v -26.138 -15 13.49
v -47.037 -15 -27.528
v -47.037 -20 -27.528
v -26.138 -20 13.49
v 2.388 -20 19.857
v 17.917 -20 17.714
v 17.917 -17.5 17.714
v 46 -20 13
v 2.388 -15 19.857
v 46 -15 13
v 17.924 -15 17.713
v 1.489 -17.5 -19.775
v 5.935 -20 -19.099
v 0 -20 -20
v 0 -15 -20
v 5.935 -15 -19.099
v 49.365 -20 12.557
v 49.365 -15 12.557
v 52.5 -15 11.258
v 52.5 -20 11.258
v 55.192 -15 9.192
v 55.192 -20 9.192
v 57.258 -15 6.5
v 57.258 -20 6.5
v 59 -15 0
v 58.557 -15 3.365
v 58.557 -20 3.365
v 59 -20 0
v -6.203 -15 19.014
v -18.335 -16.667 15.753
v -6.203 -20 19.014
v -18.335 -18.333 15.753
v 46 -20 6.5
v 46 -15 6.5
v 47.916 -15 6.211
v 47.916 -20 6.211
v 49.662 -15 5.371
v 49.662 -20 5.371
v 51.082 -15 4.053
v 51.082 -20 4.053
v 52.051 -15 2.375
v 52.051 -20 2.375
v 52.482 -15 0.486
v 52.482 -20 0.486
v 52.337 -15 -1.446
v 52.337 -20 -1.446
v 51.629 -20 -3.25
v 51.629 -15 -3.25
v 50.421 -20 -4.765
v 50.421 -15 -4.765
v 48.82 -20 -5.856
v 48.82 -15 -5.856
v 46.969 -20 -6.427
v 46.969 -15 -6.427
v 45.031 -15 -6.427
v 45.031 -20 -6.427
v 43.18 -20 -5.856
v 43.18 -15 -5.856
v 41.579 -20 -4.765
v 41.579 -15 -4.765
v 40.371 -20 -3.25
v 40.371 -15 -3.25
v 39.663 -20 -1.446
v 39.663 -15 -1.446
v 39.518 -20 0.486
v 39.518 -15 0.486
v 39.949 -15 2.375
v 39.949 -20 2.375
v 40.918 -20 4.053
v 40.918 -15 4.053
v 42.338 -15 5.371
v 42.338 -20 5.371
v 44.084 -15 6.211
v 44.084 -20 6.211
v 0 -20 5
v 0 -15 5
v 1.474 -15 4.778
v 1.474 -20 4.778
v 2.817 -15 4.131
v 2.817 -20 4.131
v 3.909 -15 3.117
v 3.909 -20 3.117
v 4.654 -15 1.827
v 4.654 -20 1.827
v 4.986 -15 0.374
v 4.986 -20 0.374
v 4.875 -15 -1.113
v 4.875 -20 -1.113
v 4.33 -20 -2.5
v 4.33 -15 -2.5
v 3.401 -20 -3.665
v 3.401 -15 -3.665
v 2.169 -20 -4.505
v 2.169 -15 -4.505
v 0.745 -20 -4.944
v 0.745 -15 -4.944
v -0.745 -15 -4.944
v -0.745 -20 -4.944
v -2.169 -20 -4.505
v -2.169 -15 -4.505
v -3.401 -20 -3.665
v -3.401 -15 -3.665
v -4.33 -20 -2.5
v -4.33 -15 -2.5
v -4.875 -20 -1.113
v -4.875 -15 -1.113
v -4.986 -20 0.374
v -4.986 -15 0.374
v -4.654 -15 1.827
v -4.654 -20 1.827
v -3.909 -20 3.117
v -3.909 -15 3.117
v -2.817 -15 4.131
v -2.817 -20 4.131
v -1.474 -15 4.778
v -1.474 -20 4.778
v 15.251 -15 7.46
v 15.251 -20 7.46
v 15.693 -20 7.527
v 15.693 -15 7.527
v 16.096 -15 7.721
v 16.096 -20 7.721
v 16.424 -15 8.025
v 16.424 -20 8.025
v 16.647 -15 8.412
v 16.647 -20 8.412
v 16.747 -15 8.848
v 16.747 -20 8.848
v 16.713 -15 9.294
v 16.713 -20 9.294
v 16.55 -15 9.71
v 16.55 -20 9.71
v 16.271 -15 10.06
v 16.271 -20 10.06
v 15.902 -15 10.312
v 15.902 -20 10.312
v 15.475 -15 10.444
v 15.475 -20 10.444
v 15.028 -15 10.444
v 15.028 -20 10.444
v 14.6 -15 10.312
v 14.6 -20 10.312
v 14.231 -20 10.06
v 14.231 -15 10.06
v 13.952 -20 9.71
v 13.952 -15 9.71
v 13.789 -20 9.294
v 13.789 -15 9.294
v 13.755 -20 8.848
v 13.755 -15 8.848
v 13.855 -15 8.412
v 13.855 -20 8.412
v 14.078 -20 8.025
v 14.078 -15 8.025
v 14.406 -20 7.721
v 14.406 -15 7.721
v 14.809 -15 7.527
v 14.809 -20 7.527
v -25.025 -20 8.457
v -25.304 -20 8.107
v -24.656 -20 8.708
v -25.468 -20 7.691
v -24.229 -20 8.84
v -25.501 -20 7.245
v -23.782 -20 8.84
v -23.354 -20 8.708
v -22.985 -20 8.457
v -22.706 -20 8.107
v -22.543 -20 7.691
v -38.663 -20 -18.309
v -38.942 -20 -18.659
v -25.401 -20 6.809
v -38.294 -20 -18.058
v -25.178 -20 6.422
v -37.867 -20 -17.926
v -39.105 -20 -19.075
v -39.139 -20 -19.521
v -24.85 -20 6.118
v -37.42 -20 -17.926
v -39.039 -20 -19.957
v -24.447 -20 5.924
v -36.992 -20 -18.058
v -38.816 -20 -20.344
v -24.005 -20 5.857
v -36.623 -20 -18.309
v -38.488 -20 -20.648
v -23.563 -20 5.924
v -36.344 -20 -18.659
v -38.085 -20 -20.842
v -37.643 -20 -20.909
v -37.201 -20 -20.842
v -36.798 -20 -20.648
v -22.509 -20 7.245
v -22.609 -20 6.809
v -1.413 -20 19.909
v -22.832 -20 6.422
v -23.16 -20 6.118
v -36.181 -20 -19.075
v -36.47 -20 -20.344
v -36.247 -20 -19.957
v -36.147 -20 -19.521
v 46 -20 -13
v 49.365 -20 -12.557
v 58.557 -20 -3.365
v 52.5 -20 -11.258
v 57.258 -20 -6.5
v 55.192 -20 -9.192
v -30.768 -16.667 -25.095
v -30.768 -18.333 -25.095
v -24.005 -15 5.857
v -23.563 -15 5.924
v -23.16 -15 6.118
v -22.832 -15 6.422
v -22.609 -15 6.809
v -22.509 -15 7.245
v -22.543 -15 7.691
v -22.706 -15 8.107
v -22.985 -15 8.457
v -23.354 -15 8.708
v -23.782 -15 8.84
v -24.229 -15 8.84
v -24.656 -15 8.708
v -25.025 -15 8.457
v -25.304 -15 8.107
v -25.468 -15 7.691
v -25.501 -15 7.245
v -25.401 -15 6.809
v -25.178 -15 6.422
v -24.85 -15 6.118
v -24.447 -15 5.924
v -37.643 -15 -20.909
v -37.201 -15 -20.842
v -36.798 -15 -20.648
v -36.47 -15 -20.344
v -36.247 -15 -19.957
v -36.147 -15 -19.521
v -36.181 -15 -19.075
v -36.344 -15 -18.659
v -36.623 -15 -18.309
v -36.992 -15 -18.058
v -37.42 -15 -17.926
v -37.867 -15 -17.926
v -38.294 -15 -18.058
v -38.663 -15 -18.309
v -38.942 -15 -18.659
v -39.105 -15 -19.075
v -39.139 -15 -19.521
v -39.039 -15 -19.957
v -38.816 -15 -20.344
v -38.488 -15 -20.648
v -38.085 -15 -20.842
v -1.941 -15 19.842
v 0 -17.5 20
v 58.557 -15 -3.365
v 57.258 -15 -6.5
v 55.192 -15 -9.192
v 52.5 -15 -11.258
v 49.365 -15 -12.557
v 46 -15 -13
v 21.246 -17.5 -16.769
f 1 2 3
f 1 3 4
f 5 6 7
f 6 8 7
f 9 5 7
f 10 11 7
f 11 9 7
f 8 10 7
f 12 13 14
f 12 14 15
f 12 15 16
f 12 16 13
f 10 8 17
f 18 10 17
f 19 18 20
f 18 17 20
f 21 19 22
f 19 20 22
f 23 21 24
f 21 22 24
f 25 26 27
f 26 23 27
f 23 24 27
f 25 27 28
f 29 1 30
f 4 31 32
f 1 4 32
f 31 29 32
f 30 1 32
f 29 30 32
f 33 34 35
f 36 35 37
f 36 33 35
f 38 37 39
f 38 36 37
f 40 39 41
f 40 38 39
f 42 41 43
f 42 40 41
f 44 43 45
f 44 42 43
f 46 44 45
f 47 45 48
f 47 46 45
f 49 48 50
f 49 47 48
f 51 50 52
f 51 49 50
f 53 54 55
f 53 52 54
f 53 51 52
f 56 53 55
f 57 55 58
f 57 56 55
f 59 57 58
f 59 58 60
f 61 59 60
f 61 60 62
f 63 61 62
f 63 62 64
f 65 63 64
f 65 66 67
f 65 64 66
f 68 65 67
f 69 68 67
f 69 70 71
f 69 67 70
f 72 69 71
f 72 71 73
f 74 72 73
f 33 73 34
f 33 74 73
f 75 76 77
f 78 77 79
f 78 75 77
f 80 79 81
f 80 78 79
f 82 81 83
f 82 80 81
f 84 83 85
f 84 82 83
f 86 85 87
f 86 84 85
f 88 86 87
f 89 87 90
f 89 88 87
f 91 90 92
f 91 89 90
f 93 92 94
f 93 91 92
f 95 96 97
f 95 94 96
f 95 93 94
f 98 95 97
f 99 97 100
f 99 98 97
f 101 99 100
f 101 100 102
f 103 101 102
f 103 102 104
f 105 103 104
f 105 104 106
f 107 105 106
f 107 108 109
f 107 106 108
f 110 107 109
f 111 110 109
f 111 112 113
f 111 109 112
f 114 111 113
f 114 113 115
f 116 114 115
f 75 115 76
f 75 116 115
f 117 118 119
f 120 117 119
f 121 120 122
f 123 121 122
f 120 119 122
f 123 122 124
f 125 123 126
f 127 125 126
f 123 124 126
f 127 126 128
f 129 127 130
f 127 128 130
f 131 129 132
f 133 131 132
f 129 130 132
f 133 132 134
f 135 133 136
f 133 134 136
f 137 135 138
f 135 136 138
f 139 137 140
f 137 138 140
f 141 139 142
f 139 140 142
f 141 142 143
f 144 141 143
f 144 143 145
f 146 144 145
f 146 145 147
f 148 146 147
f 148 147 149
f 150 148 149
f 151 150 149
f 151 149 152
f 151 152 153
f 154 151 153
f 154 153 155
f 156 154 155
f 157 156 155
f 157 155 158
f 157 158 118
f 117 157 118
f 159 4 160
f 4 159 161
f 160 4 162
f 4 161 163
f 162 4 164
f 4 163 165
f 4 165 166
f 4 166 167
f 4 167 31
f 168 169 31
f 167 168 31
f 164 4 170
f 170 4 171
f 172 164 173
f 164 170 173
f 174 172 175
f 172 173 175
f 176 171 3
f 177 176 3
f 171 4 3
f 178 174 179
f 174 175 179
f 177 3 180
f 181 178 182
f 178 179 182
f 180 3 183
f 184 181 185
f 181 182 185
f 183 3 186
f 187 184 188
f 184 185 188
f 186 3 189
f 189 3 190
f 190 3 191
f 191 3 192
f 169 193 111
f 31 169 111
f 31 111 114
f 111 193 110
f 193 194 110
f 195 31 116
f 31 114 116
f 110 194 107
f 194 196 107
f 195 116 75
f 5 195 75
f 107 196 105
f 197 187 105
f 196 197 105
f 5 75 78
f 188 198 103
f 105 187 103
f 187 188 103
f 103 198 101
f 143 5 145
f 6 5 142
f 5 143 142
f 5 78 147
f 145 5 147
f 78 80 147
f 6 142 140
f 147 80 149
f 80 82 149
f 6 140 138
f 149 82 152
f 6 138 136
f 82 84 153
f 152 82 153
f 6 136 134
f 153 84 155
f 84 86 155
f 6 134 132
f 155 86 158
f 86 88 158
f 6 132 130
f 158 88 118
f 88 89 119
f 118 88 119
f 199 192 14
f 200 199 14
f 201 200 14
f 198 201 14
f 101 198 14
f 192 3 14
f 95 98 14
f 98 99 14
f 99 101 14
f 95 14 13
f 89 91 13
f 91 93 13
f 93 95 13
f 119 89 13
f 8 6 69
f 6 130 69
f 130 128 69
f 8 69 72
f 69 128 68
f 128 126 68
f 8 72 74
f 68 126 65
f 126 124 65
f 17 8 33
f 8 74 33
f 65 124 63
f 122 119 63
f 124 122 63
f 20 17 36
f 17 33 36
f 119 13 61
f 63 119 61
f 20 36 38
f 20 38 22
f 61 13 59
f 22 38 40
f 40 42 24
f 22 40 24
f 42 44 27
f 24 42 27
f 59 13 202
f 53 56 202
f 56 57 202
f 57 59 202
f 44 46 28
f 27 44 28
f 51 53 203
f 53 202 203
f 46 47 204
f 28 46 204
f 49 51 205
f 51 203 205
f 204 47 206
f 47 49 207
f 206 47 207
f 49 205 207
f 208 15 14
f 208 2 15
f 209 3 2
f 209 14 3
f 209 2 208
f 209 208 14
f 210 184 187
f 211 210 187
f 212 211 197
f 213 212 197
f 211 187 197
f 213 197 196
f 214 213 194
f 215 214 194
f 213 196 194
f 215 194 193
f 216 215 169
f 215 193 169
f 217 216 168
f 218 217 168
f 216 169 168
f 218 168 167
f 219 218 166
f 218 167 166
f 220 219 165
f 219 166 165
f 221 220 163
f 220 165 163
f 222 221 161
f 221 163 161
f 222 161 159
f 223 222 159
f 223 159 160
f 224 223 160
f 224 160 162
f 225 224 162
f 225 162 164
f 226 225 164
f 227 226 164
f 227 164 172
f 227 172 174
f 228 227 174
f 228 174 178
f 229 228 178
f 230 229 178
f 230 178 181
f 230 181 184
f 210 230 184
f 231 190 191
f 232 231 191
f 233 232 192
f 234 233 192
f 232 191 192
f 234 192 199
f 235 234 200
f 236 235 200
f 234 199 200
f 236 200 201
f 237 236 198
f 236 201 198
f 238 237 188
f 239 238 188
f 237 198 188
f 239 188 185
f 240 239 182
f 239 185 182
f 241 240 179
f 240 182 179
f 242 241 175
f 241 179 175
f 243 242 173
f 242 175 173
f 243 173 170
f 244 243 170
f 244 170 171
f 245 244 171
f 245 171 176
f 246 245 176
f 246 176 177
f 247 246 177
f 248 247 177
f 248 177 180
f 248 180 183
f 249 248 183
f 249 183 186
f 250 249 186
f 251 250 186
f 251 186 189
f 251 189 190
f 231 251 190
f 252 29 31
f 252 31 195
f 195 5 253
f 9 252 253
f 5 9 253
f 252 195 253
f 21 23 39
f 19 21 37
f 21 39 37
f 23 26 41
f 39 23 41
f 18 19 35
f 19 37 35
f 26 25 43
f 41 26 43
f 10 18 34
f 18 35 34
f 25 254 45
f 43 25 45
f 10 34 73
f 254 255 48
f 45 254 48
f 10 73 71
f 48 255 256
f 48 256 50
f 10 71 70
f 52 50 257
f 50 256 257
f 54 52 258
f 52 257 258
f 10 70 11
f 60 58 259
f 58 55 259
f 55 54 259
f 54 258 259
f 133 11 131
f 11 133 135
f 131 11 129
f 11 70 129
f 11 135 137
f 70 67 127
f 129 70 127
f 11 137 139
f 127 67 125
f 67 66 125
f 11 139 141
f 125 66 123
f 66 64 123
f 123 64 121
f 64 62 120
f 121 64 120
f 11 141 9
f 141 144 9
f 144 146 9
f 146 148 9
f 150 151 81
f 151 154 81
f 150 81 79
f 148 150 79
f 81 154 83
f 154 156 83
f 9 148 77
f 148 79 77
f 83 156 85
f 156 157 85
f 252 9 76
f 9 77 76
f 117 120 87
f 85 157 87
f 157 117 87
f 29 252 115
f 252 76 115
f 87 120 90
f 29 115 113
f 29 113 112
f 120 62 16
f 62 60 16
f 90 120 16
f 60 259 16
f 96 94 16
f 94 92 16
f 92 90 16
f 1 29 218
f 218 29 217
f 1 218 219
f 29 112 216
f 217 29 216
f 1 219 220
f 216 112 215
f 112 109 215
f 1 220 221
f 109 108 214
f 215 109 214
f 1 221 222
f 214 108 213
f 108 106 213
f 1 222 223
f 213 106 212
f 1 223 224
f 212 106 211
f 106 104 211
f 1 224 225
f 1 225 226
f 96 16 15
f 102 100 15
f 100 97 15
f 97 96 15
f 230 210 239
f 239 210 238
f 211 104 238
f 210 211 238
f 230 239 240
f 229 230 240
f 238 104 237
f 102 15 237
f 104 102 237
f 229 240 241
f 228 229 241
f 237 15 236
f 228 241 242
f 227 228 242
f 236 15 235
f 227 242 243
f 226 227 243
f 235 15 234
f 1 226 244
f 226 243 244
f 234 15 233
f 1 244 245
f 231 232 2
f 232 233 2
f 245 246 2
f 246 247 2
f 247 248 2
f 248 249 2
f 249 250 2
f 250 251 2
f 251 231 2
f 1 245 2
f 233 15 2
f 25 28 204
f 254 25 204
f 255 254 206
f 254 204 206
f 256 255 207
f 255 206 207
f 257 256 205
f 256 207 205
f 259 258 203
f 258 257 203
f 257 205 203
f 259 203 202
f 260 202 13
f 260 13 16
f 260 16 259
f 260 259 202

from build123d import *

# Parameters (mm, degrees)
BOSS_EXTRUDE1_DEPTH      = 20
BOSS_EXTRUDE1_DEPTH_BACK = 20
SKETCH1_R                = 5
SKETCH1_R_2              = 6.5
CUT_EXTRUDE4_DEPTH       = 35
SKETCH6_R                = 1.5
CUT_EXTRUDE5_DEPTH       = 10
CUT_EXTRUDE6_DEPTH       = 50


with BuildPart() as part:
    # Sketch1 → Boss-Extrude1 (new, two sides: drawn at the far end of the back side and taken through both)
    # profile 1 of 5: a face of its own
    with BuildSketch(Plane(origin=(0, 0, 0), x_dir=(1, 0, 0), z_dir=(0, 1, 0)).offset(-BOSS_EXTRUDE1_DEPTH_BACK)):
        with BuildLine():
            add(Edge.make_bspline(
                [(-328.284271247, 28.284271247), (-322.910070204, 33.658472291), (-311.873452078, 37.427029787), (-296.732235412, 39.86629798)],
                knots=[0, 0, 0, 0, 0.1900067, 0.1900067, 0.1900067, 0.1900067], degree=3))
            ThreePointArc((-328.284271247, 28.284271247), (-328.284271247, -28.284271247), (-271.715728753, -28.284271247))
            ThreePointArc((-271.715728753, -28.284271247), (-263.0448187, -15.307337295), (-260, 0))
            ThreePointArc((-260, 0), (-270.583078139, 27.104330064), (-296.732235412, 39.86629798))
        make_face()
    # profile 2 of 5: a face of its own
    with BuildSketch(Plane(origin=(0, 0, 0), x_dir=(1, 0, 0), z_dir=(0, 1, 0)).offset(-BOSS_EXTRUDE1_DEPTH_BACK)):
        with BuildLine():
            ThreePointArc((-260, 0), (-263.0448187, -15.307337295), (-271.715728753, -28.284271247))
            add(Edge.make_bspline(
                [(-271.715728753, -28.284271247), (-194.91847241, 48.512985095), (-42.964488834, -10.495172733), (-6.202879594, -19.013791961)],
                knots=[0, 0, 0, 0, 0.930923327, 0.930923327, 0.930923327, 0.930923327], degree=3))
            ThreePointArc((-6.202879594, -19.013791961), (-19.751909265, 3.140394942), (0, 20))
            add(Edge.make_bspline(
                [(-296.732235412, 39.86629798), (-232.185648118, 50.264830728), (-93.046467117, 36.506278231), (0, 20)],
                knots=[0.1900067, 0.1900067, 0.1900067, 0.1900067, 1, 1, 1, 1], degree=3))
            ThreePointArc((-296.732235412, 39.86629798), (-270.583078139, 27.104330064), (-260, 0))
        make_face()
    # profile 3 of 5: a face of its own
    with BuildSketch(Plane(origin=(0, 0, 0), x_dir=(1, 0, 0), z_dir=(0, 1, 0)).offset(-BOSS_EXTRUDE1_DEPTH_BACK)):
        with BuildLine():
            ThreePointArc((0, 20), (-19.751909265, 3.140394942), (-6.202879594, -19.013791961))
            add(Edge.make_bspline(
                [(-6.202879594, -19.013791961), (-3.475082803, -19.645893294), (-1.381533462, -20), (0, -20)],
                knots=[0.930923327, 0.930923327, 0.930923327, 0.930923327, 1, 1, 1, 1], degree=3))
            add(Edge.make_bspline(
                [(0, -20), (0.844585297, -20), (2.387633143, -19.856968751)],
                knots=[0, 0, 0, 0.142944169, 0.142944169, 0.142944169], degree=2))
            ThreePointArc((2.387633143, -19.856968751), (14.9624975, -13.271159278), (20, 0))
            ThreePointArc((20, 0), (16.104446086, 11.859461044), (5.935318374, 19.0990051))
            add(Edge.make_bspline(
                [(0, 20), (0.011302239, 20), (5.935318374, 19.0990051)],
                knots=[0, 0, 0, 0.358766717, 0.358766717, 0.358766717], degree=2))
        make_face()
        with Locations(Location((0, 0, 0), (0, 0, 270))):
            Circle(SKETCH1_R, mode=Mode.SUBTRACT)
    # profile 4 of 5: a face of its own
    with BuildSketch(Plane(origin=(0, 0, 0), x_dir=(1, 0, 0), z_dir=(0, 1, 0)).offset(-BOSS_EXTRUDE1_DEPTH_BACK)):
        with BuildLine():
            add(Edge.make_bspline(
                [(5.935318374, 19.0990051), (16.523469771, 17.488632981), (46, 13)],
                knots=[0.358766717, 0.358766717, 0.358766717, 1, 1, 1], degree=2))
            ThreePointArc((5.935318374, 19.0990051), (16.104446086, 11.859461044), (20, 0))
            ThreePointArc((20, 0), (14.9624975, -13.271159278), (2.387633143, -19.856968751))
            add(Edge.make_bspline(
                [(2.387633143, -19.856968751), (11.639344201, -18.999390814), (46, -13)],
                knots=[0.142944169, 0.142944169, 0.142944169, 1, 1, 1], degree=2))
            ThreePointArc((46, -13), (33, 0), (46, 13))
        make_face()
    # profile 5 of 5: a face of its own
    with BuildSketch(Plane(origin=(0, 0, 0), x_dir=(1, 0, 0), z_dir=(0, 1, 0)).offset(-BOSS_EXTRUDE1_DEPTH_BACK)):
        with BuildLine():
            ThreePointArc((59, 0), (55.192388155, 9.192388155), (46, 13))
            ThreePointArc((46, 13), (33, 0), (46, -13))
            ThreePointArc((46, -13), (55.192388155, -9.192388155), (59, 0))
        make_face()
        with Locations(Location((46, 0, 0), (0, 0, 270))):
            Circle(SKETCH1_R_2, mode=Mode.SUBTRACT)
    extrude(amount=BOSS_EXTRUDE1_DEPTH + BOSS_EXTRUDE1_DEPTH_BACK)

    # Sketch5 → Cut-Extrude4 (cut)
    with BuildSketch(Plane(origin=(0, 20, 0), x_dir=(1, 0, 0), z_dir=(0, 1, 0))):
        Polygon((-47.037049996, 27.527548523), (92.120786702, 16.164640032), (85.724700256, -16.918764701), (-17.262768022, -30.907770073), align=None)
    extrude(amount=-CUT_EXTRUDE4_DEPTH, mode=Mode.SUBTRACT)

    # Sketch6 → Cut-Extrude5 (cut)
    with BuildSketch(Plane(origin=(0, -20, 0), x_dir=(-1, 0, 0), z_dir=(0, -1, 0))):
        with Locations(Location((24.005160607, -7.356928903, 0), (0, 0, 90))):
            Circle(SKETCH6_R)
        with Locations(Location((-15.251108102, -8.960330165, 0), (0, 0, 90))):
            Circle(SKETCH6_R)
        with Locations(Location((37.643080162, 19.408995291, 0), (0, 0, 90))):
            Circle(SKETCH6_R)
    extrude(amount=-CUT_EXTRUDE5_DEPTH, mode=Mode.SUBTRACT)

    # Sketch7 → Cut-Extrude6 (cut)
    with BuildSketch(Plane(origin=(0, 20, 0), x_dir=(1, 0, 0), z_dir=(0, 1, 0))):
        Polygon((-47.037049996, 27.527548523), (-26.137658318, -13.489817144), (-379.595719096, -92.580220424), (-321.505561991, 137.254748988), align=None)
    extrude(amount=-CUT_EXTRUDE6_DEPTH, mode=Mode.SUBTRACT)


solid = part.part
